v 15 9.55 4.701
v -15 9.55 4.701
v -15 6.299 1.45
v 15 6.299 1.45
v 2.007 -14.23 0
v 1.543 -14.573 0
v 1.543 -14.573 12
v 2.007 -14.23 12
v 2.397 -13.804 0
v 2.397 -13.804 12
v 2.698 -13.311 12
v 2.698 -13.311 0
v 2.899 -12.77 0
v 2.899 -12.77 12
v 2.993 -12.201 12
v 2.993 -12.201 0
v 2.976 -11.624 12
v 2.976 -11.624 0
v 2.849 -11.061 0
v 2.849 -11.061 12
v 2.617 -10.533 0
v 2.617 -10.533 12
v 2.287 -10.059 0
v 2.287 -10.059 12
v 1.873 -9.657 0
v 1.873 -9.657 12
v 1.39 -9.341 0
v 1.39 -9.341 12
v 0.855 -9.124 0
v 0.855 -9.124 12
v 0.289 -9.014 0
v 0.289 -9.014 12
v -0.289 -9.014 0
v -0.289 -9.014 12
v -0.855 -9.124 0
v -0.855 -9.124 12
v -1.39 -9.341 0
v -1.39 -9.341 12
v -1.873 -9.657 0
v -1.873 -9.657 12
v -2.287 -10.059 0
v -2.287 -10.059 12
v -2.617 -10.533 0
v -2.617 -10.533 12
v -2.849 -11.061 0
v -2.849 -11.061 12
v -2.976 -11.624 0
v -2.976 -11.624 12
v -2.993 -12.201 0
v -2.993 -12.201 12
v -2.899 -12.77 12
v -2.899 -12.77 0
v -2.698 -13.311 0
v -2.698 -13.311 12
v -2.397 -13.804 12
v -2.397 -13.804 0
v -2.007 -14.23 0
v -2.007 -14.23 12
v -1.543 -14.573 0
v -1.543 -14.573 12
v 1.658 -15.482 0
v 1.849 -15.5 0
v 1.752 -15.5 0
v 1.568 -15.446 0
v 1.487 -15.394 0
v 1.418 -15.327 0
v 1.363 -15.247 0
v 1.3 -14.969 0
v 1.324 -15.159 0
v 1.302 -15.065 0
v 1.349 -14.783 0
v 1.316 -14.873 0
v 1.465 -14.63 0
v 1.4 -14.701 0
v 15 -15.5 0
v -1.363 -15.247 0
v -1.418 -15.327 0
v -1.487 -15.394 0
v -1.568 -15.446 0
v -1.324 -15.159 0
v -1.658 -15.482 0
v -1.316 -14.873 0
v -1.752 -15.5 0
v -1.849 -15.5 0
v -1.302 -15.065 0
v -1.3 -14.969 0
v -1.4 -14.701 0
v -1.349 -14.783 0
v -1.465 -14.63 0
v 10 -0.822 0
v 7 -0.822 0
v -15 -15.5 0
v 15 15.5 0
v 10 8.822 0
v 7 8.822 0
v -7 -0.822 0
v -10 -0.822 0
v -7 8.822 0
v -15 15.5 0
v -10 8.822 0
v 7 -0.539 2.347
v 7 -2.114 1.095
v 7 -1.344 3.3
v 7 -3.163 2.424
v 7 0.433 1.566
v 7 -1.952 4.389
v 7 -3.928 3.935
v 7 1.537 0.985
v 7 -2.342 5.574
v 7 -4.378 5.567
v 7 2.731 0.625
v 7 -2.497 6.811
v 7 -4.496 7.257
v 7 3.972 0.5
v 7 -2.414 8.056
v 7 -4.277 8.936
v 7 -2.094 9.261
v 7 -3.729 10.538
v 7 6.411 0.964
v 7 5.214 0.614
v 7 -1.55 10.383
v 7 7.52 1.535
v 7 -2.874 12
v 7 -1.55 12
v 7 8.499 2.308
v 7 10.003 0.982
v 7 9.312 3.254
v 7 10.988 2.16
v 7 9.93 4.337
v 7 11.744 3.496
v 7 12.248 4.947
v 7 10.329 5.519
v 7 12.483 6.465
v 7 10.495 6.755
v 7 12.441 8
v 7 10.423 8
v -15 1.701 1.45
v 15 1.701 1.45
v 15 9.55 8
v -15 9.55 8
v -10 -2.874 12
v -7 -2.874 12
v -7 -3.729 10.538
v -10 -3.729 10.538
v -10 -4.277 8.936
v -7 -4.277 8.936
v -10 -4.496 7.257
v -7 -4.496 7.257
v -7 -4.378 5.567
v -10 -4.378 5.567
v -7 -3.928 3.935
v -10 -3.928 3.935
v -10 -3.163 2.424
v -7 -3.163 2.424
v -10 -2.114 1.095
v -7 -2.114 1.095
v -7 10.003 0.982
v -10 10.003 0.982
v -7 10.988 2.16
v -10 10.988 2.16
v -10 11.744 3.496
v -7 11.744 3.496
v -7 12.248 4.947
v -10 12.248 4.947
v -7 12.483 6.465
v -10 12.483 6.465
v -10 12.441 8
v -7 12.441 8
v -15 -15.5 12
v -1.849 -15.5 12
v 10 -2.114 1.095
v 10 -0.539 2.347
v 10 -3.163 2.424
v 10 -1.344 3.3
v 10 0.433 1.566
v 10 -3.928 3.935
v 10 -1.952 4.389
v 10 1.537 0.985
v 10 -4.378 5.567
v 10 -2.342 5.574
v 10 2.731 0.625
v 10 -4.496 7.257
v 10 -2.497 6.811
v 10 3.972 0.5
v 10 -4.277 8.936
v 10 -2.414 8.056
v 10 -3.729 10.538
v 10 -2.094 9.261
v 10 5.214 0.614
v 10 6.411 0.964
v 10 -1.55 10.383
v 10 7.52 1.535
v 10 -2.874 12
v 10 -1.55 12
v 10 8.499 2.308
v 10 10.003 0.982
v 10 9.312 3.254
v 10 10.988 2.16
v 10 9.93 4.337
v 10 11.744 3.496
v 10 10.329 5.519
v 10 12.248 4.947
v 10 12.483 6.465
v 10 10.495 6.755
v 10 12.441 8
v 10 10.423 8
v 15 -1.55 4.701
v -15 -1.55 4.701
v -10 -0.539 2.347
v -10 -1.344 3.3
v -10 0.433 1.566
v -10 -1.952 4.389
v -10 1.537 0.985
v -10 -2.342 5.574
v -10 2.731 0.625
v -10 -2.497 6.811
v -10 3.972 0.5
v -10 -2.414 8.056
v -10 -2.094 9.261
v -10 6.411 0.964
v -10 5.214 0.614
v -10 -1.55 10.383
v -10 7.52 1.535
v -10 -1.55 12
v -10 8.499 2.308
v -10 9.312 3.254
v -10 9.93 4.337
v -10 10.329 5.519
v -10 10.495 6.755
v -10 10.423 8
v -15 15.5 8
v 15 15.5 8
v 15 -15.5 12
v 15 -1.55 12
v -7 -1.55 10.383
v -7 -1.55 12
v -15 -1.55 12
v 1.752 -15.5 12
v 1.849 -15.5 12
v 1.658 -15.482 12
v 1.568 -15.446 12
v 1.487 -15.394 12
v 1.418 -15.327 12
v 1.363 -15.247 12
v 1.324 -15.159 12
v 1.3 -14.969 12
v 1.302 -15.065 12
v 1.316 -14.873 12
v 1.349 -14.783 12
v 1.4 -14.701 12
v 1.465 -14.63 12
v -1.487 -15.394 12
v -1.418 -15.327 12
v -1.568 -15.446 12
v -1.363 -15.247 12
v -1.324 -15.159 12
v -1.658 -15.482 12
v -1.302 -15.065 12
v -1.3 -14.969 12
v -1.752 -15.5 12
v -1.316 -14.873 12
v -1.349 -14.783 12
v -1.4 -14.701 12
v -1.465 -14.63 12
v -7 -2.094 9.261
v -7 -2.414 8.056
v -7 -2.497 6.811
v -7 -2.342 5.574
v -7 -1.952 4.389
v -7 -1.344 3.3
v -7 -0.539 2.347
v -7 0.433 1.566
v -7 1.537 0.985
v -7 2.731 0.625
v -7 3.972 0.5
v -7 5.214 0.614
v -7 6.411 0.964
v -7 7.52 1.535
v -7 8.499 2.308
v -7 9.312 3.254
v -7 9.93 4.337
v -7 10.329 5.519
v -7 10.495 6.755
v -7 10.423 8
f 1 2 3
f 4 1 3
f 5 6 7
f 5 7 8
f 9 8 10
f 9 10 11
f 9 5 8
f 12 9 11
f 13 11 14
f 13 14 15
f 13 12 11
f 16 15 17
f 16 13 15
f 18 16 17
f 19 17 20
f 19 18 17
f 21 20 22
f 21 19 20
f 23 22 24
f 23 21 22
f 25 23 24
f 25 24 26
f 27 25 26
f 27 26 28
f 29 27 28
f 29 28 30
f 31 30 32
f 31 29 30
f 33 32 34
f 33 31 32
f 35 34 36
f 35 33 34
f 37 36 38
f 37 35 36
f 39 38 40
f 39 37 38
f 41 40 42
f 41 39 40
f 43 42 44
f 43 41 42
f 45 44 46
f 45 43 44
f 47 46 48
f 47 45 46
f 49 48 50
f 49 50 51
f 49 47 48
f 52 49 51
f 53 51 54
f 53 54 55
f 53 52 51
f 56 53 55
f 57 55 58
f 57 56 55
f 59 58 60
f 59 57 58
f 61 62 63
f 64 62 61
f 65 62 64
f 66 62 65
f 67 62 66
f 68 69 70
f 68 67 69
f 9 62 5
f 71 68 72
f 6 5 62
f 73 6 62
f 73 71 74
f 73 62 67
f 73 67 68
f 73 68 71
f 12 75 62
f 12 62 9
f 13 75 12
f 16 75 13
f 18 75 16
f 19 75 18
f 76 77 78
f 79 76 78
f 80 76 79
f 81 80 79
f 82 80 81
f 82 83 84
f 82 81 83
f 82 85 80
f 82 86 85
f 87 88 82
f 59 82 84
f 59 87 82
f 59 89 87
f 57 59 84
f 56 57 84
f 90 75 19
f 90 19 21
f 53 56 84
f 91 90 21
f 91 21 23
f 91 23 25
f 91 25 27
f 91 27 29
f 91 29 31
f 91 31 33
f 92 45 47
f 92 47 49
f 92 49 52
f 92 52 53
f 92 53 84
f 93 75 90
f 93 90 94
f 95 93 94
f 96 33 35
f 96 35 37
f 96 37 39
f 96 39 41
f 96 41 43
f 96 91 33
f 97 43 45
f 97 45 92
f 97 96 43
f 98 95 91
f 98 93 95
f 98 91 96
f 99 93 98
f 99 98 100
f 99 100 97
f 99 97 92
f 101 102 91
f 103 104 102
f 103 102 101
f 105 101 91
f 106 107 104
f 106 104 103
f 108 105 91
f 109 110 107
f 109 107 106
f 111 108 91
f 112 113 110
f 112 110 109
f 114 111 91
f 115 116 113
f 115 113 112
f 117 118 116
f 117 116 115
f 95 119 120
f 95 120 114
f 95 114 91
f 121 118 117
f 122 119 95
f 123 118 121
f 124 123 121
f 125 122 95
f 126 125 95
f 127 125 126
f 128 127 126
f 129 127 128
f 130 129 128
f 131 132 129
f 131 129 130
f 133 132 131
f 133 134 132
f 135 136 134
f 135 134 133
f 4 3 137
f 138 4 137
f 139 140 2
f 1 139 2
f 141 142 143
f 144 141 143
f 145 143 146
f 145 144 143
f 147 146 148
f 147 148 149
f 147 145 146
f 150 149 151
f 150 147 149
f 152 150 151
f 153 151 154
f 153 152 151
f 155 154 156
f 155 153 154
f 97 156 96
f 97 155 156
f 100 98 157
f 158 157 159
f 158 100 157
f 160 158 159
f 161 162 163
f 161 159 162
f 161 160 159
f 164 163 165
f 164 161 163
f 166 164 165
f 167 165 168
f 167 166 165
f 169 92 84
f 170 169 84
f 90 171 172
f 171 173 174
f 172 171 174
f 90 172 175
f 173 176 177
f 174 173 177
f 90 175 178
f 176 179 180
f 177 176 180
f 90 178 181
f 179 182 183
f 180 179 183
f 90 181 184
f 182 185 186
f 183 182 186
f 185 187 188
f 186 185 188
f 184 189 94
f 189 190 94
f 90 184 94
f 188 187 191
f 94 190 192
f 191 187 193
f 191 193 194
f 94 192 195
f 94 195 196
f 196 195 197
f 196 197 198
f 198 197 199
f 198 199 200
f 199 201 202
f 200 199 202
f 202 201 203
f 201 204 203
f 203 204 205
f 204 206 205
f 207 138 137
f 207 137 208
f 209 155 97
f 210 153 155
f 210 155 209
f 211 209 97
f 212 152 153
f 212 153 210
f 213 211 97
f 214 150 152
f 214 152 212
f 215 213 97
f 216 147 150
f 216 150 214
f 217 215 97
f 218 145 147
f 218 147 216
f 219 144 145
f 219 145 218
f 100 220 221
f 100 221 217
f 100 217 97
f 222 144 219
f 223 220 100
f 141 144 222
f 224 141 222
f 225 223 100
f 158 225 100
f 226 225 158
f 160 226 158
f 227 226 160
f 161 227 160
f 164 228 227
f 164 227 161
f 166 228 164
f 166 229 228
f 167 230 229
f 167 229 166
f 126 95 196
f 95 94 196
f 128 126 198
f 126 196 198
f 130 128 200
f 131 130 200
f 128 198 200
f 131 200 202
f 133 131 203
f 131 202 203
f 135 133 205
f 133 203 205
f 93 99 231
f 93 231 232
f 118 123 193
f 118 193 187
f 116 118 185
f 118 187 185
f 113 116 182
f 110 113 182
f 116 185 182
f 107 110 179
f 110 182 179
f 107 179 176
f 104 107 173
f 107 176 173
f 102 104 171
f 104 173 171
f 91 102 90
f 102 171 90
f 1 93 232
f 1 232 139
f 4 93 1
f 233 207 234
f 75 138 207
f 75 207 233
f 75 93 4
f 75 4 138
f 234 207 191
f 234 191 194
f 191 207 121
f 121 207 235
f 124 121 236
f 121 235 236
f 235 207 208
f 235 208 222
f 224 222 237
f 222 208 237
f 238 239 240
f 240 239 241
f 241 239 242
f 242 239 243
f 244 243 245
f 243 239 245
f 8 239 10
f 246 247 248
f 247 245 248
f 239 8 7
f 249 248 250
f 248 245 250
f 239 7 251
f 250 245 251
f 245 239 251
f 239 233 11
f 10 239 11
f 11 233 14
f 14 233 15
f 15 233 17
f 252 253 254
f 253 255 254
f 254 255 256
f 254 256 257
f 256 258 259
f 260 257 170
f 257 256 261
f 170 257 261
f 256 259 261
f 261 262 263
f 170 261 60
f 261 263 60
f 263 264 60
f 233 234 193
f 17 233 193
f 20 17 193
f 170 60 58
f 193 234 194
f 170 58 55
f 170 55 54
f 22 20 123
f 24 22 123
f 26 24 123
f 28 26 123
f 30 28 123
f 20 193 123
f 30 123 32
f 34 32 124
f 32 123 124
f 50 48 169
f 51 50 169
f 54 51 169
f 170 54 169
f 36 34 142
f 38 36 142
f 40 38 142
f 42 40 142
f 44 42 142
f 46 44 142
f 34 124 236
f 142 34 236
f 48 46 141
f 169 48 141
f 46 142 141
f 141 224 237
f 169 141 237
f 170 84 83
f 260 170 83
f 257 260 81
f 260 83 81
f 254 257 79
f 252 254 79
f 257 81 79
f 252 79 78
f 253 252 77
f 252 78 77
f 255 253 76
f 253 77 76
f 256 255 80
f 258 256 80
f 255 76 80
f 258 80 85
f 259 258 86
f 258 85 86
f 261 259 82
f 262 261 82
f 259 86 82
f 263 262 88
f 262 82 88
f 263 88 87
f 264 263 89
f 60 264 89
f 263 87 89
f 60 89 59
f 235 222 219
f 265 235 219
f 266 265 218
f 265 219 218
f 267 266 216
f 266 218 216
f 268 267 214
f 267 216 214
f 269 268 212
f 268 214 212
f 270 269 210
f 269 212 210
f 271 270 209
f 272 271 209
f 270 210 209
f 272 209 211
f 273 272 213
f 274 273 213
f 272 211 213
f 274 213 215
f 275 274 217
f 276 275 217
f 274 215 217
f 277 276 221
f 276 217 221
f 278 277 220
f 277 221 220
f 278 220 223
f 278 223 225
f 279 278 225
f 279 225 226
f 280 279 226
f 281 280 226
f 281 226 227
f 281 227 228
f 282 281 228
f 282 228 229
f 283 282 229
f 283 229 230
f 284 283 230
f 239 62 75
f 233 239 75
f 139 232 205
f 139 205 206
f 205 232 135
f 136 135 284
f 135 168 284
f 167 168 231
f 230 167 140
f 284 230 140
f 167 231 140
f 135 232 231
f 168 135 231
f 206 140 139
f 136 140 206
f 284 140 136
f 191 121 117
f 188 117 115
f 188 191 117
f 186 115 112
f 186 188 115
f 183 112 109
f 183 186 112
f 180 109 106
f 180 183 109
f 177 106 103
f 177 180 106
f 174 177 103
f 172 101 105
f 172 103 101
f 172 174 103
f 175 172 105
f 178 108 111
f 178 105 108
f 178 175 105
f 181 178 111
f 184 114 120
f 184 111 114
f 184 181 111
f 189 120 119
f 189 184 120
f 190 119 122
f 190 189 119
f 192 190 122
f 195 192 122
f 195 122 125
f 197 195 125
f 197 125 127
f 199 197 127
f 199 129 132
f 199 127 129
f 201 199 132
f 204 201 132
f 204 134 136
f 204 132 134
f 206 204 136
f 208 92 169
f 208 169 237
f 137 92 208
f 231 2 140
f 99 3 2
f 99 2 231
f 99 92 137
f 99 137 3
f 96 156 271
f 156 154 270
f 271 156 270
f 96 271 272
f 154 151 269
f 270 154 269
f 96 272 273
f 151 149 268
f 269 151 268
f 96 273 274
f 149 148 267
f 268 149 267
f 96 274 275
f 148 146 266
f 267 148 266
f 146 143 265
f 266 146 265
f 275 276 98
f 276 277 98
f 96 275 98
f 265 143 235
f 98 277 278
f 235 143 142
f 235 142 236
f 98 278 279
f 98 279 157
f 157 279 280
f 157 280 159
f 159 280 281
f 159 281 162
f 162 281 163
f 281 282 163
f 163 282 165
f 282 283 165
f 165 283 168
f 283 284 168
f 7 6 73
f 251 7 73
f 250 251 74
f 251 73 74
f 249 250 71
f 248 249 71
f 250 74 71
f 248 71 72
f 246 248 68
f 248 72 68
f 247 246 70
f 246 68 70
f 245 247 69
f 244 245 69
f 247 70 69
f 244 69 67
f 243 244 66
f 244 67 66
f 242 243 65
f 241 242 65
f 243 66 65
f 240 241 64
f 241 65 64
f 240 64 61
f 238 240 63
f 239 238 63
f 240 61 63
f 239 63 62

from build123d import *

# Parameters (mm, degrees)
SKETCH003_R     = 8.5
PAD001_DEPTH    = 3
SKETCH004_R     = 6.5
POCKET002_DEPTH = 3.001
PAD_DEPTH       = 12
POCKET_DEPTH    = 30.001
SKETCH002_W     = 5.95
SKETCH002_H     = 4
POCKET001_DEPTH = 30.001


with BuildPart() as pocket002:
    # Sketch003 → Pad001 (new body)
    with BuildSketch(Plane.YZ.offset(10)):
        with Locations((4, 7)):
            Circle(SKETCH003_R)
    extrude(amount=-PAD001_DEPTH)

    # Sketch004 → Pocket002 (cut, through all)
    with BuildSketch(Plane.YZ.offset(10)):
        with Locations((4, 7)):
            Circle(SKETCH004_R)
    extrude(amount=-POCKET002_DEPTH, mode=Mode.SUBTRACT)


with BuildPart() as part_mirroring:
    # Part__Mirroring: instance of Pocket002
    add(pocket002.part.mirror(Plane(origin=(0, 0, 0), x_dir=(0, -1, 0), z_dir=(1, 0, 0))))


with BuildPart() as cut001:
    # Sketch → Pad (new body)
    with BuildSketch(Plane.XY):
        with BuildLine():
            Line((-15, 15.5), (15, 15.5))
            Line((15, 15.5), (15, -15.5))
            Line((1.848981, -15.5), (15, -15.5))
            ThreePointArc((1.543183, -14.572662), (1.323663, -15.159139), (1.848981, -15.5))
            ThreePointArc((1.543183, -14.572662), (0, -9), (-1.543183, -14.572662))
            ThreePointArc((-1.848981, -15.5), (-1.323663, -15.159139), (-1.543183, -14.572662))
            Line((-15, -15.5), (-1.848981, -15.5))
            Line((-15, -15.5), (-15, 15.5))
        make_face()
    extrude(amount=PAD_DEPTH)

    # Sketch001 → Pocket (cut, through all)
    with BuildSketch(Plane(origin=(-15, 0, 0), x_dir=(0, -1, 0), z_dir=(-1, 0, 0))):
        Polygon((1.55, 4.701115), (1.55, 9.298885), (1.55, 12), (-9.55, 12), (-9.55, 9.298885), (-9.55, 4.701115), (-6.298885, 1.45), (-1.701115, 1.45), align=None)
    extrude(amount=-POCKET_DEPTH, mode=Mode.SUBTRACT)

    # Sketch002 → Pocket001 (cut, through all)
    with BuildSketch(Plane(origin=(-15, 0, 0), x_dir=(0, -1, 0), z_dir=(-1, 0, 0))):
        with Locations((-12.525, 10)):
            Rectangle(SKETCH002_W, SKETCH002_H)
    extrude(amount=-POCKET001_DEPTH, mode=Mode.SUBTRACT)

    # Cut: cut Part__Mirroring
    add(part_mirroring.part, mode=Mode.SUBTRACT)

    # Cut001: cut Pocket002
    add(pocket002.part, mode=Mode.SUBTRACT)


solid = cut001.part
